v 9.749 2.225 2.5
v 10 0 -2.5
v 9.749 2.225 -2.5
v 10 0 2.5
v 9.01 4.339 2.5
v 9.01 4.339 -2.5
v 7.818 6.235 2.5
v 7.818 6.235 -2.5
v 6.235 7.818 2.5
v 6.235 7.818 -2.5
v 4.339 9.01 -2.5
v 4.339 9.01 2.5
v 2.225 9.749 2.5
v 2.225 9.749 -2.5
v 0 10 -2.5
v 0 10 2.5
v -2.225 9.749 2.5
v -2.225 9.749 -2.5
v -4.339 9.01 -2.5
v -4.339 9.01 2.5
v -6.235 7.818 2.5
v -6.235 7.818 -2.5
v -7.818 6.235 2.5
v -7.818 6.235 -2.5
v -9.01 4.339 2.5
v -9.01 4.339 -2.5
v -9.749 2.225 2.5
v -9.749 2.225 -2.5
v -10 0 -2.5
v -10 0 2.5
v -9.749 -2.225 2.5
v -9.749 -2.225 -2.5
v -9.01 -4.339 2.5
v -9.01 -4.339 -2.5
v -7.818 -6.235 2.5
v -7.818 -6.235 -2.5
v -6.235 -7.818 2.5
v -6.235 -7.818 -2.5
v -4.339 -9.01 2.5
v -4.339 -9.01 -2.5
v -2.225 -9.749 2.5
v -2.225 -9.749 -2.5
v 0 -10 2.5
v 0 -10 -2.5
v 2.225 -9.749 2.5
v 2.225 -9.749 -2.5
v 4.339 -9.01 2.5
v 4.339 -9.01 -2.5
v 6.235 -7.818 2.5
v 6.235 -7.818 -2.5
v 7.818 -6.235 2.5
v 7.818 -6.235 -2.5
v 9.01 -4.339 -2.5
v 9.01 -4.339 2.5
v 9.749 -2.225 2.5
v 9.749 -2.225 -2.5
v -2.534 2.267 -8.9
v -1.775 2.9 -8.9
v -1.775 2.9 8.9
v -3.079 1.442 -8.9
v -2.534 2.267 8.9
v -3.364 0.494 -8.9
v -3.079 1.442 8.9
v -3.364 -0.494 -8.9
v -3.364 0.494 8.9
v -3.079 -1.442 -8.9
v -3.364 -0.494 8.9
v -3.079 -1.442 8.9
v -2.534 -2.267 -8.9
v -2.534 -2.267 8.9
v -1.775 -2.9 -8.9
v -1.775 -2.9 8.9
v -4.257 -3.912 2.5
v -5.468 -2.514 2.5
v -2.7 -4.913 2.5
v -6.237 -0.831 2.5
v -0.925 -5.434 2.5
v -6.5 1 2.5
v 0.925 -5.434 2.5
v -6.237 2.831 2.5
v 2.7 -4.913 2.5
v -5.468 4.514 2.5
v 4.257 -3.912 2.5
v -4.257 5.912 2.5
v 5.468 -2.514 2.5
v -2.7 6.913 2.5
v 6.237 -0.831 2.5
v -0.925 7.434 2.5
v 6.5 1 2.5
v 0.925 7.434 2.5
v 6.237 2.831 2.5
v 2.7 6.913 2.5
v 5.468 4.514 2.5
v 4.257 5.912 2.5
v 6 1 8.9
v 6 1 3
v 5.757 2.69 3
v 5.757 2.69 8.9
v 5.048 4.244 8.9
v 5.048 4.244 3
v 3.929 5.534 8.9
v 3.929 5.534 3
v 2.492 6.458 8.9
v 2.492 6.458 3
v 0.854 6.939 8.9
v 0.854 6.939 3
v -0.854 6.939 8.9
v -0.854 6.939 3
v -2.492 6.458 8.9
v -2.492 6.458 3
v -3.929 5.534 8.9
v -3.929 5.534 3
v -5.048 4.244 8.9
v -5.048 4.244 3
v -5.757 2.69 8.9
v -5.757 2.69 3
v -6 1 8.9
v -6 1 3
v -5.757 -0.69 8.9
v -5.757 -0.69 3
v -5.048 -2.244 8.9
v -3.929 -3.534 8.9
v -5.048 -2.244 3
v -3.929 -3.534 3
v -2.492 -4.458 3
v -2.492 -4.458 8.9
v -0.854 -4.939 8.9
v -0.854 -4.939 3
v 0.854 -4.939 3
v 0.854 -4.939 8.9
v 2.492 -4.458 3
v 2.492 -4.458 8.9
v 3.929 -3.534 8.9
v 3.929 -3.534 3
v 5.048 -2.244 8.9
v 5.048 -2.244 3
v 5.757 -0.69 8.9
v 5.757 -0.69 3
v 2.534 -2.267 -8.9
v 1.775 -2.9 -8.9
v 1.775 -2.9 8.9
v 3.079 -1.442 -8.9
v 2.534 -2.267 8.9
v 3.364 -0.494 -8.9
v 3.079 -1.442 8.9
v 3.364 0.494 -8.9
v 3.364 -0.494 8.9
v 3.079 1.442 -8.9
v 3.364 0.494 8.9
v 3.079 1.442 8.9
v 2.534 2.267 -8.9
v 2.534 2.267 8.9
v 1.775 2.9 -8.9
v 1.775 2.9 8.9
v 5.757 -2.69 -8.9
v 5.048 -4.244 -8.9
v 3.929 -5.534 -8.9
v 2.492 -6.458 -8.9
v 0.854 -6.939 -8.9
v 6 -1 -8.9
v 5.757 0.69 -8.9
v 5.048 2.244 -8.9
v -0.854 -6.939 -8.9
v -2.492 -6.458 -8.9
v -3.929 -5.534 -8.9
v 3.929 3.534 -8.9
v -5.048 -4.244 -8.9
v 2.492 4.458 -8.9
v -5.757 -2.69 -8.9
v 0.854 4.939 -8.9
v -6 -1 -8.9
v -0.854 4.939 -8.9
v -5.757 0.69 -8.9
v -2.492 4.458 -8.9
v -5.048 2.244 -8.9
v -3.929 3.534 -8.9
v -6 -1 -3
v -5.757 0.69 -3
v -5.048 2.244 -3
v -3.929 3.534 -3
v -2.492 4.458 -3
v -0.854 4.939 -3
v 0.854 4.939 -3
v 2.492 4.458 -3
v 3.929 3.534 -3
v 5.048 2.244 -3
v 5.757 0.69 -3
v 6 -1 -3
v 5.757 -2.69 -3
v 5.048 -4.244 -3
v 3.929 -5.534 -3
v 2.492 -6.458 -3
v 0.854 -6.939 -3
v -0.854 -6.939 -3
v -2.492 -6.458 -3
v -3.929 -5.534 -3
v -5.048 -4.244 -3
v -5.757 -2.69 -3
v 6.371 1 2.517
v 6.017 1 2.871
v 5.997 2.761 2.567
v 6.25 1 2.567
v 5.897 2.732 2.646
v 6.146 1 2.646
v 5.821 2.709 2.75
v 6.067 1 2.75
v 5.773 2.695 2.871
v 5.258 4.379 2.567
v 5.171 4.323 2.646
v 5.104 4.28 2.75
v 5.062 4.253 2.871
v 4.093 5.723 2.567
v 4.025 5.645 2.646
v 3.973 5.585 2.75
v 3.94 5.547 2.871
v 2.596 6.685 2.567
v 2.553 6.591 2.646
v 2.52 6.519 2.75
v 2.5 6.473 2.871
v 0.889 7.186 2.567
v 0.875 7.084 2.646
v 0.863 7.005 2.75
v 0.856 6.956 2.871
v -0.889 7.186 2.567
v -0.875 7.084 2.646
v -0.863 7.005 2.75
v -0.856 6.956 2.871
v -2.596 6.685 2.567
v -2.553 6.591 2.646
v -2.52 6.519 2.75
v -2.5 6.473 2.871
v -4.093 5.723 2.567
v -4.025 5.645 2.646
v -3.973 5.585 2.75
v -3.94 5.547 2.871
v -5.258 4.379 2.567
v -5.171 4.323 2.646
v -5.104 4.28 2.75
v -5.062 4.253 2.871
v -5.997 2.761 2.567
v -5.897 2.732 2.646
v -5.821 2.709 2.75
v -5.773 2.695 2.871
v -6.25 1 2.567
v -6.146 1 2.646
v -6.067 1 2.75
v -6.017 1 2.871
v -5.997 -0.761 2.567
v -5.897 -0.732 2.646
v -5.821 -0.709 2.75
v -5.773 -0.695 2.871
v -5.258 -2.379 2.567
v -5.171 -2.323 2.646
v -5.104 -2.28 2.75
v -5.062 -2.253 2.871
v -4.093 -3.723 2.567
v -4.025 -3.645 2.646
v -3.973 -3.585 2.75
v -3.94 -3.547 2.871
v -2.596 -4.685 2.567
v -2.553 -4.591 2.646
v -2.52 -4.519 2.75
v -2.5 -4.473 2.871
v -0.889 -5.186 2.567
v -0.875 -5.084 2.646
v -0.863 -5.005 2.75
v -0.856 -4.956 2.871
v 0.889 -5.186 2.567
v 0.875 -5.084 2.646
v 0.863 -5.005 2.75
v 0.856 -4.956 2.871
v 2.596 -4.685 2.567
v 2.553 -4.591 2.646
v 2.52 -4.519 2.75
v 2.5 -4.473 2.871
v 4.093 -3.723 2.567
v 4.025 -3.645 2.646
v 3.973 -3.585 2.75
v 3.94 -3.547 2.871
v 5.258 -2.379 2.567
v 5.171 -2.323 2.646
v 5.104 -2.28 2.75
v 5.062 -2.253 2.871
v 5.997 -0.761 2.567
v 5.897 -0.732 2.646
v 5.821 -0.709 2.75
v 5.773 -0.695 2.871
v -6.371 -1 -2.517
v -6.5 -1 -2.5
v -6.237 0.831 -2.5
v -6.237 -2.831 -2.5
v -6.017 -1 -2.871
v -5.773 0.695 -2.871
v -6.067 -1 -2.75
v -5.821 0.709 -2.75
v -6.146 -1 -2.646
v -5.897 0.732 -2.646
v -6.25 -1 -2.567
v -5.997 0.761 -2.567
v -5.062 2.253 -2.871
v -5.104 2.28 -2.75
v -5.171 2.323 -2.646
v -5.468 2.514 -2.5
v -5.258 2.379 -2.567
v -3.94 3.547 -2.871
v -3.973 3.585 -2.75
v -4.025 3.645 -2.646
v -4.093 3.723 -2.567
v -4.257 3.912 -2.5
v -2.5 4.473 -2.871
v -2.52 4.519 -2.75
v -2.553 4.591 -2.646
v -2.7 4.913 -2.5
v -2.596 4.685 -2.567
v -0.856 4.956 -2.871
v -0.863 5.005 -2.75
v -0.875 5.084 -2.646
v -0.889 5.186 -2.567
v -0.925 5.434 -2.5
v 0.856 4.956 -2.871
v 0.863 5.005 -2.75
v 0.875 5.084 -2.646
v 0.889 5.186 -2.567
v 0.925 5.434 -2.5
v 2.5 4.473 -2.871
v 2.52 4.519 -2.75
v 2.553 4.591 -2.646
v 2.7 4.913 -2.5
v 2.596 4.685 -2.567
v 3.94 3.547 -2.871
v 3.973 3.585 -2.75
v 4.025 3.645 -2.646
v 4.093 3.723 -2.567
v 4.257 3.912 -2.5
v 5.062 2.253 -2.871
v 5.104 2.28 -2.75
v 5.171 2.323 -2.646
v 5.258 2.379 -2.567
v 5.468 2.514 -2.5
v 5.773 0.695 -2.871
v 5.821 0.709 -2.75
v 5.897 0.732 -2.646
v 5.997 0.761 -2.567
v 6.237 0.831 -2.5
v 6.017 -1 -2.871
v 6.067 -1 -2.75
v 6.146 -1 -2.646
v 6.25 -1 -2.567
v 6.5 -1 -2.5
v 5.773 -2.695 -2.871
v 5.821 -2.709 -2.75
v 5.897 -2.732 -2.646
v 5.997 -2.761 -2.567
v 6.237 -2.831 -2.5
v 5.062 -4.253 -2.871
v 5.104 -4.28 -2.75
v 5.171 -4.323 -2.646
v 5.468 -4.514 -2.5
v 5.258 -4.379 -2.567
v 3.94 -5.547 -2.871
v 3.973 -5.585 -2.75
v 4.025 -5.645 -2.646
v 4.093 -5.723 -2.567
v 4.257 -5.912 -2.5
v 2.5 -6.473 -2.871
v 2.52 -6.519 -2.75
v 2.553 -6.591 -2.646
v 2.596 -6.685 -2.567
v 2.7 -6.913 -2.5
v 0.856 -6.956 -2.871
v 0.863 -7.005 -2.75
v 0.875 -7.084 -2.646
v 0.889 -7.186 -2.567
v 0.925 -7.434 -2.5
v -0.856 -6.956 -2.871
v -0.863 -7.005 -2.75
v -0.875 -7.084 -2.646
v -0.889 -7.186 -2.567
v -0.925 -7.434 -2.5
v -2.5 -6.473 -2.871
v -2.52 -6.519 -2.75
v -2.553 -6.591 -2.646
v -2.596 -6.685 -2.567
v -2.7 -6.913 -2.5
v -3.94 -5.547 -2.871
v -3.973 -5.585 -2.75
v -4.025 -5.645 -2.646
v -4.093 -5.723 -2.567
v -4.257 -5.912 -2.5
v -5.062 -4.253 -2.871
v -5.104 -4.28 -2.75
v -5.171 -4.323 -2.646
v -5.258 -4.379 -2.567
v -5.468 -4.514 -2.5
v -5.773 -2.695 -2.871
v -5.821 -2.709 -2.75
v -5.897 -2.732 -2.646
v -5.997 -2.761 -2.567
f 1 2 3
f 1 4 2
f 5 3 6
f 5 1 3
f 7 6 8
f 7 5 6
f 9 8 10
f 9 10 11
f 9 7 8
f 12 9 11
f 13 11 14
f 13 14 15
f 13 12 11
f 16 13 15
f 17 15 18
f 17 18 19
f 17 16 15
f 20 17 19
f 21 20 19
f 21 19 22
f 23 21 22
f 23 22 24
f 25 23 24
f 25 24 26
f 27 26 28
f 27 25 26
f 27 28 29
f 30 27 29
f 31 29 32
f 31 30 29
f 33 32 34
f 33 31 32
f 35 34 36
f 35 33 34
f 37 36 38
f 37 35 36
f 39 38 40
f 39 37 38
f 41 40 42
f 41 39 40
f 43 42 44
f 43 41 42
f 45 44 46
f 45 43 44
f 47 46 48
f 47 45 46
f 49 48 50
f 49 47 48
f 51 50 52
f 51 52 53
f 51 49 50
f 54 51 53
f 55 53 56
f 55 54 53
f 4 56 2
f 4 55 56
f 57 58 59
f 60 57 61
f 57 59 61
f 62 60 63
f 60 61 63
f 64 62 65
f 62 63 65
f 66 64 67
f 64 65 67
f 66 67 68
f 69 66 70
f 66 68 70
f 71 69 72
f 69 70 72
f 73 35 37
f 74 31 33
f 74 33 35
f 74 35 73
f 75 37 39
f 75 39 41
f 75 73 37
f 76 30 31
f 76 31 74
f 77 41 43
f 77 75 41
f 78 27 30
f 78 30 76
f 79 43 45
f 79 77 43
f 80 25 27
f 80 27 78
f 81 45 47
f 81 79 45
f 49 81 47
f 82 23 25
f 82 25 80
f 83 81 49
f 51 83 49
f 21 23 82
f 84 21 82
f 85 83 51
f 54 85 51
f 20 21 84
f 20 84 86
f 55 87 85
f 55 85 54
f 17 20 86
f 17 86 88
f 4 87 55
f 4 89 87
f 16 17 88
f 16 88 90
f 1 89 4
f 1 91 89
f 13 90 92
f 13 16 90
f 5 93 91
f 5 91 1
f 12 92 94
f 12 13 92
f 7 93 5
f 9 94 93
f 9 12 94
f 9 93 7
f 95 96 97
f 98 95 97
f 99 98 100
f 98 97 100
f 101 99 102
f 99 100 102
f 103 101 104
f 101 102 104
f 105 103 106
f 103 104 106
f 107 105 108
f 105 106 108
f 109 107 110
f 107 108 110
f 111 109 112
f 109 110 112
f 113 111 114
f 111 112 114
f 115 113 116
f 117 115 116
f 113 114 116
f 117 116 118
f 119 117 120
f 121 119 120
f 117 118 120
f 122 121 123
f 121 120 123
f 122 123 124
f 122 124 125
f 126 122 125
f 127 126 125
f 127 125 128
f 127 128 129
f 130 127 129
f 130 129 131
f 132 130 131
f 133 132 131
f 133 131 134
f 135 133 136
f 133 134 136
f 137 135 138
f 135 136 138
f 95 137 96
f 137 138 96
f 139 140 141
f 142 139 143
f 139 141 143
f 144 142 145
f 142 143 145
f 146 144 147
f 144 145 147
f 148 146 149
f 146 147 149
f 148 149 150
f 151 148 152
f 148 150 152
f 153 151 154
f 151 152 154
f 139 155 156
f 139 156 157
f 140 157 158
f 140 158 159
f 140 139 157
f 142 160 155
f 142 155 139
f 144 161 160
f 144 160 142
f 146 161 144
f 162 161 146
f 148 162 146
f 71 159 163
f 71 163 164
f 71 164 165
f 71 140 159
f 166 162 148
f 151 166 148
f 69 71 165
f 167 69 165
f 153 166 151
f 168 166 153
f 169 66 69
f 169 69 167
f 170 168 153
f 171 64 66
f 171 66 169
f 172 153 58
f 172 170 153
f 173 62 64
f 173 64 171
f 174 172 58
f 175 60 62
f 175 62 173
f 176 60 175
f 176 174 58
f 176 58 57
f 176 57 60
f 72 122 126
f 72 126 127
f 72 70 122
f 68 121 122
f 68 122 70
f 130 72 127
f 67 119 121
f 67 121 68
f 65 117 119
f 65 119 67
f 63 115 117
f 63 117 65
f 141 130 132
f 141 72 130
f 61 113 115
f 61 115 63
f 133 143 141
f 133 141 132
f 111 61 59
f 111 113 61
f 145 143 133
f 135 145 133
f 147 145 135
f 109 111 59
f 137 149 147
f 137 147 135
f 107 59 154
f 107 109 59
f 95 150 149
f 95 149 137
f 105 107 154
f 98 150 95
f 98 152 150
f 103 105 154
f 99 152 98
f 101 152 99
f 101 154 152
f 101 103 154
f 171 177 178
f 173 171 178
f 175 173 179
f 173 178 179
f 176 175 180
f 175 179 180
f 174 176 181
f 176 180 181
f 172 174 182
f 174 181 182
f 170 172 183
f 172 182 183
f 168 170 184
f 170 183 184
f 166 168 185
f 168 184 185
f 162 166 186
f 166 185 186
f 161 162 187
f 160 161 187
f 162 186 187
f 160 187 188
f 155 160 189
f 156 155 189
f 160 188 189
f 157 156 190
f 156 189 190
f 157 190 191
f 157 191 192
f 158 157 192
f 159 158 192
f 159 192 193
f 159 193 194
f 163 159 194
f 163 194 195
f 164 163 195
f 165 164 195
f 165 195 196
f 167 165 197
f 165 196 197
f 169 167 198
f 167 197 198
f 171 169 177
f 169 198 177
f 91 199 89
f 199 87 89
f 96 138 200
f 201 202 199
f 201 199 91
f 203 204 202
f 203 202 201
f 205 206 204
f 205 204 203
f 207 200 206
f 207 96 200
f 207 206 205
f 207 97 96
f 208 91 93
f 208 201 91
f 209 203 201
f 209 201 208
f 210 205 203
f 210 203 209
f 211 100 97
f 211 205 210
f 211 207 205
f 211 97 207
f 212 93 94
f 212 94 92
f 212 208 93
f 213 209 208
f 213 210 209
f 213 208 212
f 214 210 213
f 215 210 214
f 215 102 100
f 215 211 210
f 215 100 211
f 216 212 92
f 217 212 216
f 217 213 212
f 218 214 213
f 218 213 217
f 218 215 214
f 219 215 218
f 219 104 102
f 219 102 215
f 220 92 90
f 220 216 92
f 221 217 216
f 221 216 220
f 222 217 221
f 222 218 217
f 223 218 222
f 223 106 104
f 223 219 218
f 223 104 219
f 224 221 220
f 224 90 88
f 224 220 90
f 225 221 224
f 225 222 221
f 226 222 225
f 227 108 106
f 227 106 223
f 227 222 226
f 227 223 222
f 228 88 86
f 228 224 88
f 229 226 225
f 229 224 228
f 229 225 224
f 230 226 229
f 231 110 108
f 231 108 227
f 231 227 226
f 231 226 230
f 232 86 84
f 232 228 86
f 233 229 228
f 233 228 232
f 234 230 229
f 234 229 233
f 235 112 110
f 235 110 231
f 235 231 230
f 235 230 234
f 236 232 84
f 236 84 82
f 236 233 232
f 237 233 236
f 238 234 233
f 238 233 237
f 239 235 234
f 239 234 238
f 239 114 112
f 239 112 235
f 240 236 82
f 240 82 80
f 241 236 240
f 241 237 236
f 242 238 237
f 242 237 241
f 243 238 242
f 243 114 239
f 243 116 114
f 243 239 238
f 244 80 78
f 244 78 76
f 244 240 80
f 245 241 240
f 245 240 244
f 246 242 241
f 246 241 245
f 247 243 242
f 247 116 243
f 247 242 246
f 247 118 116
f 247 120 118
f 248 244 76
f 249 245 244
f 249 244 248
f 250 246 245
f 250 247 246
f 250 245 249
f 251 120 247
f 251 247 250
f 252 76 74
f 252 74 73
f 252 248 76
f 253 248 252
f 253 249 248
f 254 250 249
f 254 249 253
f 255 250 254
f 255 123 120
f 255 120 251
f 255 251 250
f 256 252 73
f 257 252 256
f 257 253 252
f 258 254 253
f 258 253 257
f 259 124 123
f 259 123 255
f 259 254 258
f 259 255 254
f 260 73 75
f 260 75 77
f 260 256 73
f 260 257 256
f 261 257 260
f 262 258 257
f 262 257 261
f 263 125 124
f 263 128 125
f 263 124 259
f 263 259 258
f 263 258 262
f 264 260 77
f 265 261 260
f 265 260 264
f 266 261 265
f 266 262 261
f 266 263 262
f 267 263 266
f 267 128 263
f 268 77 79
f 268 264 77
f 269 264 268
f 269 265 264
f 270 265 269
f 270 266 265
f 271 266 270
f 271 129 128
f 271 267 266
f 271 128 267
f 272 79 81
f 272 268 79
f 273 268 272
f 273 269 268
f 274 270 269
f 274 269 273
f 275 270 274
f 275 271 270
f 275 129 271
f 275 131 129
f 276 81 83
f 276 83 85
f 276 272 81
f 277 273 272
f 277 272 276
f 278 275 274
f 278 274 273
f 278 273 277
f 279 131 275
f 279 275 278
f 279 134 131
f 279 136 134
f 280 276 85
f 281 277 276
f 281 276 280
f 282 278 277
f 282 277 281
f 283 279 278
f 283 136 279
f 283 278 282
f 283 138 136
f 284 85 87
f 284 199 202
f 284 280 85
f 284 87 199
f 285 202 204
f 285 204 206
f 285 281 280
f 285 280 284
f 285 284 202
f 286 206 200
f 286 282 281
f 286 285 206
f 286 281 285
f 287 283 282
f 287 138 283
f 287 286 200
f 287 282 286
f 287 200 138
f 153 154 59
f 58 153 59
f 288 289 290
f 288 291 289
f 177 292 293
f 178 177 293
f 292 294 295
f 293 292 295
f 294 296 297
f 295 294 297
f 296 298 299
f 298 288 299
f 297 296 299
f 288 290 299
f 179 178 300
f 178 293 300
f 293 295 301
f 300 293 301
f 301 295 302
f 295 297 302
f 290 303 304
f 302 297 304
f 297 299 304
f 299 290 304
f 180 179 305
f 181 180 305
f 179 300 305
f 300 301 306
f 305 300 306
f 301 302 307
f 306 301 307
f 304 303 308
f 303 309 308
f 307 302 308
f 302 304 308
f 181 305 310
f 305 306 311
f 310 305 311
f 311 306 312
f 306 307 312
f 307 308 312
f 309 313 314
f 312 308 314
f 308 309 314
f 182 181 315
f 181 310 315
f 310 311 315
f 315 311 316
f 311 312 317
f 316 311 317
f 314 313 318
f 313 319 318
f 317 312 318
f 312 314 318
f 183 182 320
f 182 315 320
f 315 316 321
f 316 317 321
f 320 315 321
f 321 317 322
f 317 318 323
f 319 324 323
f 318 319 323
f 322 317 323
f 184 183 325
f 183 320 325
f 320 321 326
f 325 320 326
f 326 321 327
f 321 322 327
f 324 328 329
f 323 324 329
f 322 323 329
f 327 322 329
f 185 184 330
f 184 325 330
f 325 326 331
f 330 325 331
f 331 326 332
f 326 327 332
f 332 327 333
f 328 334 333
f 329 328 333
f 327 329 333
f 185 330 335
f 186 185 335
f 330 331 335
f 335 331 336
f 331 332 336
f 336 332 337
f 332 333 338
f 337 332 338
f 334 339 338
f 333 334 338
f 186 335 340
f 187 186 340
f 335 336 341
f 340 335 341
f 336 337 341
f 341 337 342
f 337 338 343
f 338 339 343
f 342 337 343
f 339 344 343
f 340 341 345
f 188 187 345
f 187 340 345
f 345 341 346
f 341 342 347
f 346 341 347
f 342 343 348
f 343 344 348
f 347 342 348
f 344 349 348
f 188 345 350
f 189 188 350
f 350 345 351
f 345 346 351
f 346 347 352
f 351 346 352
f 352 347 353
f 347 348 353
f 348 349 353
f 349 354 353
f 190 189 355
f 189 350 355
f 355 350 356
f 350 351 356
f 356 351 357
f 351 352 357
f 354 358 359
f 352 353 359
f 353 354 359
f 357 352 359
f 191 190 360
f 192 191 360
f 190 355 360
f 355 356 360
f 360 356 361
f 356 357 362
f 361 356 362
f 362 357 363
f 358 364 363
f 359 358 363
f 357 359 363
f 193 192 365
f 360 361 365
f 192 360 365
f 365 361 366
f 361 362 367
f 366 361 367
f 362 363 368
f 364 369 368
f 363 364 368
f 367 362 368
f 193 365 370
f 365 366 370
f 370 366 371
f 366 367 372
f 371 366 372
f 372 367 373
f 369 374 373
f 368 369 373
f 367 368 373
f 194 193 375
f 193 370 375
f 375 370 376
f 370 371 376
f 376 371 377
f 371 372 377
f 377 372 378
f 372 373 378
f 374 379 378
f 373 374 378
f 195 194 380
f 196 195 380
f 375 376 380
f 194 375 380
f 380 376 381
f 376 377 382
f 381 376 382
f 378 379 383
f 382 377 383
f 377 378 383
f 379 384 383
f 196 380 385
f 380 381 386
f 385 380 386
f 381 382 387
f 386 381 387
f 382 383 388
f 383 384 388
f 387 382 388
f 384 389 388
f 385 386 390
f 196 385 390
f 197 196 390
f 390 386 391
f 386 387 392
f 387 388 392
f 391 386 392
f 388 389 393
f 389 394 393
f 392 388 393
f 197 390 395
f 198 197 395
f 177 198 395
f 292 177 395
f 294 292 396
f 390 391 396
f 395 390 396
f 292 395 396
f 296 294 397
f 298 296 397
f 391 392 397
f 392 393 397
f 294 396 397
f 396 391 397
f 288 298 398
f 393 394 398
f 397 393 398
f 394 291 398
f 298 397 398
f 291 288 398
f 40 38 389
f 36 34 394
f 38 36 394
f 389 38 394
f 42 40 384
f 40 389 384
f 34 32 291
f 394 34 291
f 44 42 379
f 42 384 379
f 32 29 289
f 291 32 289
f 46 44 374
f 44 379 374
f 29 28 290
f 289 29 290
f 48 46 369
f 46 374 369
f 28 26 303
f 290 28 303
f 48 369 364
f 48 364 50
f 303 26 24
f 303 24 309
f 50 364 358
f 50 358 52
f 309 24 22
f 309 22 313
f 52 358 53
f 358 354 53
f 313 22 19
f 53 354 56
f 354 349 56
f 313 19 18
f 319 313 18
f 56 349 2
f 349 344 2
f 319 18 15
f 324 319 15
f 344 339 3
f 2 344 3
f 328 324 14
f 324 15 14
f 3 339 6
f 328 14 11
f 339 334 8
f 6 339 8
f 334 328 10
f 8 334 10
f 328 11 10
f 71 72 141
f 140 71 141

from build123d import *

# Parameters (mm, degrees)
SKETCH6_R               = 10
BOSS_EXTRUDE4_DEPTH     = 2.5
SKETCH7_R               = 6
BOSS_EXTRUDE5_DEPTH     = 6.4
SKETCH8_R               = 6
BOSS_EXTRUDE6_DEPTH     = 6.4
CUT_EXTRUDE1_DEPTH      = 7.4
CUT_EXTRUDE1_DEPTH_BACK = 12.4
FILLET1_R               = 0.5


with BuildPart() as part:
    # Sketch6 → Boss-Extrude4 (new body, symmetric)
    with BuildSketch(Plane.XY):
        Circle(SKETCH6_R)
    extrude(amount=BOSS_EXTRUDE4_DEPTH, both=True)

    # Sketch7 → Boss-Extrude5 (add)
    with BuildSketch(Plane.XY.offset(2.5)):
        with Locations((0, 1)):
            Circle(SKETCH7_R)
    extrude(amount=BOSS_EXTRUDE5_DEPTH)

    # Sketch8 → Boss-Extrude6 (add)
    with BuildSketch(Plane(origin=(0, 0, -2.5), x_dir=(-1, 0, 0), z_dir=(0, 0, -1))):
        with Locations((0, -1)):
            Circle(SKETCH8_R)
    extrude(amount=BOSS_EXTRUDE6_DEPTH)

    # Sketch11 → Cut-Extrude1 (cut, two sides)
    with BuildSketch(Plane.XY.offset(2.5)) as cut_extrude1_sk:
        with BuildLine():
            Line((-1.774823935, -2.9), (1.774823935, -2.9))
            ThreePointArc((1.774823935, -2.9), (3.4, 0), (1.774823935, 2.9))
            Line((1.774823935, 2.9), (-1.774823935, 2.9))
            ThreePointArc((-1.774823935, 2.9), (-3.4, 0), (-1.774823935, -2.9))
        make_face()
    extrude(amount=CUT_EXTRUDE1_DEPTH, mode=Mode.SUBTRACT)
    extrude(cut_extrude1_sk.sketch, amount=-CUT_EXTRUDE1_DEPTH_BACK, mode=Mode.SUBTRACT)

    # Fillet1
    fillet1_edges = [part.edges().sort_by_distance(p)[0] for p in [
        (6, -1, -2.5),
        (-6, 1, 2.5),
    ]]
    fillet(fillet1_edges, radius=FILLET1_R)


solid = part.part
